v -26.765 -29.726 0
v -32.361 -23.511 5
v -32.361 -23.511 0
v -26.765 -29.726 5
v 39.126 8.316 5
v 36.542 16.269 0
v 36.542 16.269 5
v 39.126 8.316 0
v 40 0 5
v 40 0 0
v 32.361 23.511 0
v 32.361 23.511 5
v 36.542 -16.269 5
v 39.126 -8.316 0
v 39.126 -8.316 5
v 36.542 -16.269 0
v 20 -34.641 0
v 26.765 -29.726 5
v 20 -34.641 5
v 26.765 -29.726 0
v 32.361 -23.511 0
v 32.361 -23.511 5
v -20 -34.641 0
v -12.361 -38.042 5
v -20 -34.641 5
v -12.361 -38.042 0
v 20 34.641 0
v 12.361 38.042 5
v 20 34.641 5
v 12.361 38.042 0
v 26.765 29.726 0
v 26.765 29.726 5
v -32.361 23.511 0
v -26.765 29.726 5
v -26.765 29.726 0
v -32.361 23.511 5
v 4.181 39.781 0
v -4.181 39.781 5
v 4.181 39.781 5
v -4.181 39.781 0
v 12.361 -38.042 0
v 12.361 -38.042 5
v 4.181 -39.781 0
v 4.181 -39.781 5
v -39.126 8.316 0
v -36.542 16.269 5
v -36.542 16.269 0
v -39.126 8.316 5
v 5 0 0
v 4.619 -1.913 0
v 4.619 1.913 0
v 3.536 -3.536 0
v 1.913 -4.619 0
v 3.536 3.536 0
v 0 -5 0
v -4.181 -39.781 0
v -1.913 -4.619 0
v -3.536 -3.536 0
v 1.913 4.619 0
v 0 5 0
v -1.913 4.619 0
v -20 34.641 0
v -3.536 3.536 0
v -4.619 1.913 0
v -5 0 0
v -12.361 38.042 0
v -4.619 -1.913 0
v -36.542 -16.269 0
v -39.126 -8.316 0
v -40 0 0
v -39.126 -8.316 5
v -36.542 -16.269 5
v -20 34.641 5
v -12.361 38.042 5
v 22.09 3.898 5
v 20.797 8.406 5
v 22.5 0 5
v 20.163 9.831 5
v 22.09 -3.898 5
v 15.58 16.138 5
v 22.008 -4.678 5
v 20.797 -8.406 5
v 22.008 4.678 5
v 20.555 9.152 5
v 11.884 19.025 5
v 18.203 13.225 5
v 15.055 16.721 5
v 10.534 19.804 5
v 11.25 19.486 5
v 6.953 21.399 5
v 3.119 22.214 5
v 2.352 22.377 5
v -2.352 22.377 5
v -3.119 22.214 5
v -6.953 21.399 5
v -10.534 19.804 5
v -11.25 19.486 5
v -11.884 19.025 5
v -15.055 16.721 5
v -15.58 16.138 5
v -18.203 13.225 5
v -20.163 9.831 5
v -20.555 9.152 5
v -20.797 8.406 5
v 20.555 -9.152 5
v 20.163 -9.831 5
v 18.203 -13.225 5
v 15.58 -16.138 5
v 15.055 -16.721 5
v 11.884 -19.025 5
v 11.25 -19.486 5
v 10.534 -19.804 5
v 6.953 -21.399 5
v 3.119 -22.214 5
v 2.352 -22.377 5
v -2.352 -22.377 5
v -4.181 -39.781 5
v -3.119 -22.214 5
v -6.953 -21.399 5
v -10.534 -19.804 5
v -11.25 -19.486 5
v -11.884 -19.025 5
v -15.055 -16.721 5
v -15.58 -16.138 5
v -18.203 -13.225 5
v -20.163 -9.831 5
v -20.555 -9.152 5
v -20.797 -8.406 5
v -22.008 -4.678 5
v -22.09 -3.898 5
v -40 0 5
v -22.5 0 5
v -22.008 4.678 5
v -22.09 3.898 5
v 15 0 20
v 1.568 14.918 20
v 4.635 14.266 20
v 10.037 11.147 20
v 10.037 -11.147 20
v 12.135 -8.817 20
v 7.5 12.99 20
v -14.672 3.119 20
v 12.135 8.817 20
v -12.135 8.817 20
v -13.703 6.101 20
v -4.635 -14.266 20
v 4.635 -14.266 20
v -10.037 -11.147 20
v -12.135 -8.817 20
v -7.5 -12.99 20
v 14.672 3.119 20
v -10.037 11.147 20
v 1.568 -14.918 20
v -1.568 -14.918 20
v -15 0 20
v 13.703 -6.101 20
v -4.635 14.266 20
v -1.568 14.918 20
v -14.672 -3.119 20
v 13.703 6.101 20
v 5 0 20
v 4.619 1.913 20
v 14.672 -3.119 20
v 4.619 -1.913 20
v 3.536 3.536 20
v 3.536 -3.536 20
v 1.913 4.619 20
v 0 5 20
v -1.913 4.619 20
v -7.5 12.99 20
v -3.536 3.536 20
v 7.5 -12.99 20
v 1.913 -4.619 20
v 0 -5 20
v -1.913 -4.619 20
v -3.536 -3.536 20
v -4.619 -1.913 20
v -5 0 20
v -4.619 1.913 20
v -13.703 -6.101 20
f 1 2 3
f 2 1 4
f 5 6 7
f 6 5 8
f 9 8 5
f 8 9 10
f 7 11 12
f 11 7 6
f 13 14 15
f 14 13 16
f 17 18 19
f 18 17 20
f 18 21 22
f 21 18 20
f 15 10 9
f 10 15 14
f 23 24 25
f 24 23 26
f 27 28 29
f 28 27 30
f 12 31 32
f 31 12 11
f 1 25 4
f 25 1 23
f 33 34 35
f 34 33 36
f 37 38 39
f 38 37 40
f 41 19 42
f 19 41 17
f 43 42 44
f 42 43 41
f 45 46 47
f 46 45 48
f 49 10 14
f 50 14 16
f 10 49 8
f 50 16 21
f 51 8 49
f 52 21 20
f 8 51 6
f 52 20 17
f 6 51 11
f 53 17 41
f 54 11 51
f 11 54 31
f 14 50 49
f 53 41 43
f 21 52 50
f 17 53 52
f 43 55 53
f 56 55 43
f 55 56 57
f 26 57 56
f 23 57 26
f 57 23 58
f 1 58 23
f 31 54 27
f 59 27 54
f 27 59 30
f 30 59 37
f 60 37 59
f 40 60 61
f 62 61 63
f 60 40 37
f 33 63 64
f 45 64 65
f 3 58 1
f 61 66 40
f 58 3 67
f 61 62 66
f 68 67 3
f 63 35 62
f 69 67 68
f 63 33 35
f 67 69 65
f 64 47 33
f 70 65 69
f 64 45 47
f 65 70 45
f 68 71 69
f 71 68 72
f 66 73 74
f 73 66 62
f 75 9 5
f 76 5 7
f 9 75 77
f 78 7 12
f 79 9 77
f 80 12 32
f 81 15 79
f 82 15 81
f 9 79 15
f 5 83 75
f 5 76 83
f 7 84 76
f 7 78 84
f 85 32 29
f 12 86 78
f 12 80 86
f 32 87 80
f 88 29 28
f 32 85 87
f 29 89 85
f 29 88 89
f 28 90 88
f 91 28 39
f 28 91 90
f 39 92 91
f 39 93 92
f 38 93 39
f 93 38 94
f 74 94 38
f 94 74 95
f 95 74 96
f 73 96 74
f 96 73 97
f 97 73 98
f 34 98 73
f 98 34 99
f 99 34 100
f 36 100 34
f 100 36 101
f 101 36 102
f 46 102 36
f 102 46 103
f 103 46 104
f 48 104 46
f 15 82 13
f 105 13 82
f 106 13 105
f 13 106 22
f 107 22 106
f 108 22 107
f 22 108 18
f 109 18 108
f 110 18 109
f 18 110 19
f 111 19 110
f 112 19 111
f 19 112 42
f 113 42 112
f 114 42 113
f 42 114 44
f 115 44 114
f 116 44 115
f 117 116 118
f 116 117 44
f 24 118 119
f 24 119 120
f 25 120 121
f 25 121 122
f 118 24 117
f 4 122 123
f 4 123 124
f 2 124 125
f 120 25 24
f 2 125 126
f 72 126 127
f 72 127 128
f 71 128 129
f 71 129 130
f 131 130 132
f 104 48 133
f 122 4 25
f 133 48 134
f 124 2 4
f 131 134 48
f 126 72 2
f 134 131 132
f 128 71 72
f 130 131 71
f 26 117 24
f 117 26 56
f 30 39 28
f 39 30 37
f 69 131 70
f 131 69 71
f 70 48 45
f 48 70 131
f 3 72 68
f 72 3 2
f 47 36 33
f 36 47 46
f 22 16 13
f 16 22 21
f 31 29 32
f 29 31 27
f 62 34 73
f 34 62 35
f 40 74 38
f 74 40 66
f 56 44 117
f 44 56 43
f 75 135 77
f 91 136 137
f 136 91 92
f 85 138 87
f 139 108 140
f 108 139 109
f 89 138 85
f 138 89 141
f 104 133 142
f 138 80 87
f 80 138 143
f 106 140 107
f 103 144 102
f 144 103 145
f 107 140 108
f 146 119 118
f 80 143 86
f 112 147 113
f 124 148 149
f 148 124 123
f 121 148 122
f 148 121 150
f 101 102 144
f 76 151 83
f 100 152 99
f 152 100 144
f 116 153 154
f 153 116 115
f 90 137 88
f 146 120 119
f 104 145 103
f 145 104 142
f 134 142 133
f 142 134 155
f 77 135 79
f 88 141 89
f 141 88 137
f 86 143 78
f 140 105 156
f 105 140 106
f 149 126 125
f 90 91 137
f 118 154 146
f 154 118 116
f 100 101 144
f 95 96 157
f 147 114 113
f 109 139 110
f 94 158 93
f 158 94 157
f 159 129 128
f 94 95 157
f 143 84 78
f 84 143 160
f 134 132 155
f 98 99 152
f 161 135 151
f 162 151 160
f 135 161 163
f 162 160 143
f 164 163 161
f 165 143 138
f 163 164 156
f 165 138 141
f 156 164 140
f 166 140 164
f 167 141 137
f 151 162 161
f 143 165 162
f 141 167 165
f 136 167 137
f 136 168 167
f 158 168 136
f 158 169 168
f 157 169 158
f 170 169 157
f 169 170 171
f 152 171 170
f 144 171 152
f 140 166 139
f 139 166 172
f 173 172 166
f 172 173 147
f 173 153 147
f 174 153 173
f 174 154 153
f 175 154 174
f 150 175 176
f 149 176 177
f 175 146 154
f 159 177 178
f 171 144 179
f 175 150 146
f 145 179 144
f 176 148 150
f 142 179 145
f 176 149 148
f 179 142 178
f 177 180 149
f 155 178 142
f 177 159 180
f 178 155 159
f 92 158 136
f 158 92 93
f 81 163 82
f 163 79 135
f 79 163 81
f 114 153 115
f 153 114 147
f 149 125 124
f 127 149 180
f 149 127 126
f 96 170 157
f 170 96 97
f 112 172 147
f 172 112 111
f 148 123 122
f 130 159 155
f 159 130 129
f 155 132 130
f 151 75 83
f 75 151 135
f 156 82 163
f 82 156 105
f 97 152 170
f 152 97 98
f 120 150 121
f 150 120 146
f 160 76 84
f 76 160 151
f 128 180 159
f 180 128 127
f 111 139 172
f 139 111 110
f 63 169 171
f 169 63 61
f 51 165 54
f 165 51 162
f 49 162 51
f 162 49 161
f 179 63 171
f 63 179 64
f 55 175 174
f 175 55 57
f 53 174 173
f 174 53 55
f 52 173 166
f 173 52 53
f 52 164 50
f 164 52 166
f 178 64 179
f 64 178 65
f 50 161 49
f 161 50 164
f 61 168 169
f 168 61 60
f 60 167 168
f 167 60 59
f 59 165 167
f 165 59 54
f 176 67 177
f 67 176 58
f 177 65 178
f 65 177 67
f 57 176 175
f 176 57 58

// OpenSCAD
module dial() {
	difference() {
		union() {
			cylinder(h=5, r=40);
			cylinder(h=20, r1=25, r2=15);
		}
		cylinder(h=30, r=5);
	}
}

dial();
